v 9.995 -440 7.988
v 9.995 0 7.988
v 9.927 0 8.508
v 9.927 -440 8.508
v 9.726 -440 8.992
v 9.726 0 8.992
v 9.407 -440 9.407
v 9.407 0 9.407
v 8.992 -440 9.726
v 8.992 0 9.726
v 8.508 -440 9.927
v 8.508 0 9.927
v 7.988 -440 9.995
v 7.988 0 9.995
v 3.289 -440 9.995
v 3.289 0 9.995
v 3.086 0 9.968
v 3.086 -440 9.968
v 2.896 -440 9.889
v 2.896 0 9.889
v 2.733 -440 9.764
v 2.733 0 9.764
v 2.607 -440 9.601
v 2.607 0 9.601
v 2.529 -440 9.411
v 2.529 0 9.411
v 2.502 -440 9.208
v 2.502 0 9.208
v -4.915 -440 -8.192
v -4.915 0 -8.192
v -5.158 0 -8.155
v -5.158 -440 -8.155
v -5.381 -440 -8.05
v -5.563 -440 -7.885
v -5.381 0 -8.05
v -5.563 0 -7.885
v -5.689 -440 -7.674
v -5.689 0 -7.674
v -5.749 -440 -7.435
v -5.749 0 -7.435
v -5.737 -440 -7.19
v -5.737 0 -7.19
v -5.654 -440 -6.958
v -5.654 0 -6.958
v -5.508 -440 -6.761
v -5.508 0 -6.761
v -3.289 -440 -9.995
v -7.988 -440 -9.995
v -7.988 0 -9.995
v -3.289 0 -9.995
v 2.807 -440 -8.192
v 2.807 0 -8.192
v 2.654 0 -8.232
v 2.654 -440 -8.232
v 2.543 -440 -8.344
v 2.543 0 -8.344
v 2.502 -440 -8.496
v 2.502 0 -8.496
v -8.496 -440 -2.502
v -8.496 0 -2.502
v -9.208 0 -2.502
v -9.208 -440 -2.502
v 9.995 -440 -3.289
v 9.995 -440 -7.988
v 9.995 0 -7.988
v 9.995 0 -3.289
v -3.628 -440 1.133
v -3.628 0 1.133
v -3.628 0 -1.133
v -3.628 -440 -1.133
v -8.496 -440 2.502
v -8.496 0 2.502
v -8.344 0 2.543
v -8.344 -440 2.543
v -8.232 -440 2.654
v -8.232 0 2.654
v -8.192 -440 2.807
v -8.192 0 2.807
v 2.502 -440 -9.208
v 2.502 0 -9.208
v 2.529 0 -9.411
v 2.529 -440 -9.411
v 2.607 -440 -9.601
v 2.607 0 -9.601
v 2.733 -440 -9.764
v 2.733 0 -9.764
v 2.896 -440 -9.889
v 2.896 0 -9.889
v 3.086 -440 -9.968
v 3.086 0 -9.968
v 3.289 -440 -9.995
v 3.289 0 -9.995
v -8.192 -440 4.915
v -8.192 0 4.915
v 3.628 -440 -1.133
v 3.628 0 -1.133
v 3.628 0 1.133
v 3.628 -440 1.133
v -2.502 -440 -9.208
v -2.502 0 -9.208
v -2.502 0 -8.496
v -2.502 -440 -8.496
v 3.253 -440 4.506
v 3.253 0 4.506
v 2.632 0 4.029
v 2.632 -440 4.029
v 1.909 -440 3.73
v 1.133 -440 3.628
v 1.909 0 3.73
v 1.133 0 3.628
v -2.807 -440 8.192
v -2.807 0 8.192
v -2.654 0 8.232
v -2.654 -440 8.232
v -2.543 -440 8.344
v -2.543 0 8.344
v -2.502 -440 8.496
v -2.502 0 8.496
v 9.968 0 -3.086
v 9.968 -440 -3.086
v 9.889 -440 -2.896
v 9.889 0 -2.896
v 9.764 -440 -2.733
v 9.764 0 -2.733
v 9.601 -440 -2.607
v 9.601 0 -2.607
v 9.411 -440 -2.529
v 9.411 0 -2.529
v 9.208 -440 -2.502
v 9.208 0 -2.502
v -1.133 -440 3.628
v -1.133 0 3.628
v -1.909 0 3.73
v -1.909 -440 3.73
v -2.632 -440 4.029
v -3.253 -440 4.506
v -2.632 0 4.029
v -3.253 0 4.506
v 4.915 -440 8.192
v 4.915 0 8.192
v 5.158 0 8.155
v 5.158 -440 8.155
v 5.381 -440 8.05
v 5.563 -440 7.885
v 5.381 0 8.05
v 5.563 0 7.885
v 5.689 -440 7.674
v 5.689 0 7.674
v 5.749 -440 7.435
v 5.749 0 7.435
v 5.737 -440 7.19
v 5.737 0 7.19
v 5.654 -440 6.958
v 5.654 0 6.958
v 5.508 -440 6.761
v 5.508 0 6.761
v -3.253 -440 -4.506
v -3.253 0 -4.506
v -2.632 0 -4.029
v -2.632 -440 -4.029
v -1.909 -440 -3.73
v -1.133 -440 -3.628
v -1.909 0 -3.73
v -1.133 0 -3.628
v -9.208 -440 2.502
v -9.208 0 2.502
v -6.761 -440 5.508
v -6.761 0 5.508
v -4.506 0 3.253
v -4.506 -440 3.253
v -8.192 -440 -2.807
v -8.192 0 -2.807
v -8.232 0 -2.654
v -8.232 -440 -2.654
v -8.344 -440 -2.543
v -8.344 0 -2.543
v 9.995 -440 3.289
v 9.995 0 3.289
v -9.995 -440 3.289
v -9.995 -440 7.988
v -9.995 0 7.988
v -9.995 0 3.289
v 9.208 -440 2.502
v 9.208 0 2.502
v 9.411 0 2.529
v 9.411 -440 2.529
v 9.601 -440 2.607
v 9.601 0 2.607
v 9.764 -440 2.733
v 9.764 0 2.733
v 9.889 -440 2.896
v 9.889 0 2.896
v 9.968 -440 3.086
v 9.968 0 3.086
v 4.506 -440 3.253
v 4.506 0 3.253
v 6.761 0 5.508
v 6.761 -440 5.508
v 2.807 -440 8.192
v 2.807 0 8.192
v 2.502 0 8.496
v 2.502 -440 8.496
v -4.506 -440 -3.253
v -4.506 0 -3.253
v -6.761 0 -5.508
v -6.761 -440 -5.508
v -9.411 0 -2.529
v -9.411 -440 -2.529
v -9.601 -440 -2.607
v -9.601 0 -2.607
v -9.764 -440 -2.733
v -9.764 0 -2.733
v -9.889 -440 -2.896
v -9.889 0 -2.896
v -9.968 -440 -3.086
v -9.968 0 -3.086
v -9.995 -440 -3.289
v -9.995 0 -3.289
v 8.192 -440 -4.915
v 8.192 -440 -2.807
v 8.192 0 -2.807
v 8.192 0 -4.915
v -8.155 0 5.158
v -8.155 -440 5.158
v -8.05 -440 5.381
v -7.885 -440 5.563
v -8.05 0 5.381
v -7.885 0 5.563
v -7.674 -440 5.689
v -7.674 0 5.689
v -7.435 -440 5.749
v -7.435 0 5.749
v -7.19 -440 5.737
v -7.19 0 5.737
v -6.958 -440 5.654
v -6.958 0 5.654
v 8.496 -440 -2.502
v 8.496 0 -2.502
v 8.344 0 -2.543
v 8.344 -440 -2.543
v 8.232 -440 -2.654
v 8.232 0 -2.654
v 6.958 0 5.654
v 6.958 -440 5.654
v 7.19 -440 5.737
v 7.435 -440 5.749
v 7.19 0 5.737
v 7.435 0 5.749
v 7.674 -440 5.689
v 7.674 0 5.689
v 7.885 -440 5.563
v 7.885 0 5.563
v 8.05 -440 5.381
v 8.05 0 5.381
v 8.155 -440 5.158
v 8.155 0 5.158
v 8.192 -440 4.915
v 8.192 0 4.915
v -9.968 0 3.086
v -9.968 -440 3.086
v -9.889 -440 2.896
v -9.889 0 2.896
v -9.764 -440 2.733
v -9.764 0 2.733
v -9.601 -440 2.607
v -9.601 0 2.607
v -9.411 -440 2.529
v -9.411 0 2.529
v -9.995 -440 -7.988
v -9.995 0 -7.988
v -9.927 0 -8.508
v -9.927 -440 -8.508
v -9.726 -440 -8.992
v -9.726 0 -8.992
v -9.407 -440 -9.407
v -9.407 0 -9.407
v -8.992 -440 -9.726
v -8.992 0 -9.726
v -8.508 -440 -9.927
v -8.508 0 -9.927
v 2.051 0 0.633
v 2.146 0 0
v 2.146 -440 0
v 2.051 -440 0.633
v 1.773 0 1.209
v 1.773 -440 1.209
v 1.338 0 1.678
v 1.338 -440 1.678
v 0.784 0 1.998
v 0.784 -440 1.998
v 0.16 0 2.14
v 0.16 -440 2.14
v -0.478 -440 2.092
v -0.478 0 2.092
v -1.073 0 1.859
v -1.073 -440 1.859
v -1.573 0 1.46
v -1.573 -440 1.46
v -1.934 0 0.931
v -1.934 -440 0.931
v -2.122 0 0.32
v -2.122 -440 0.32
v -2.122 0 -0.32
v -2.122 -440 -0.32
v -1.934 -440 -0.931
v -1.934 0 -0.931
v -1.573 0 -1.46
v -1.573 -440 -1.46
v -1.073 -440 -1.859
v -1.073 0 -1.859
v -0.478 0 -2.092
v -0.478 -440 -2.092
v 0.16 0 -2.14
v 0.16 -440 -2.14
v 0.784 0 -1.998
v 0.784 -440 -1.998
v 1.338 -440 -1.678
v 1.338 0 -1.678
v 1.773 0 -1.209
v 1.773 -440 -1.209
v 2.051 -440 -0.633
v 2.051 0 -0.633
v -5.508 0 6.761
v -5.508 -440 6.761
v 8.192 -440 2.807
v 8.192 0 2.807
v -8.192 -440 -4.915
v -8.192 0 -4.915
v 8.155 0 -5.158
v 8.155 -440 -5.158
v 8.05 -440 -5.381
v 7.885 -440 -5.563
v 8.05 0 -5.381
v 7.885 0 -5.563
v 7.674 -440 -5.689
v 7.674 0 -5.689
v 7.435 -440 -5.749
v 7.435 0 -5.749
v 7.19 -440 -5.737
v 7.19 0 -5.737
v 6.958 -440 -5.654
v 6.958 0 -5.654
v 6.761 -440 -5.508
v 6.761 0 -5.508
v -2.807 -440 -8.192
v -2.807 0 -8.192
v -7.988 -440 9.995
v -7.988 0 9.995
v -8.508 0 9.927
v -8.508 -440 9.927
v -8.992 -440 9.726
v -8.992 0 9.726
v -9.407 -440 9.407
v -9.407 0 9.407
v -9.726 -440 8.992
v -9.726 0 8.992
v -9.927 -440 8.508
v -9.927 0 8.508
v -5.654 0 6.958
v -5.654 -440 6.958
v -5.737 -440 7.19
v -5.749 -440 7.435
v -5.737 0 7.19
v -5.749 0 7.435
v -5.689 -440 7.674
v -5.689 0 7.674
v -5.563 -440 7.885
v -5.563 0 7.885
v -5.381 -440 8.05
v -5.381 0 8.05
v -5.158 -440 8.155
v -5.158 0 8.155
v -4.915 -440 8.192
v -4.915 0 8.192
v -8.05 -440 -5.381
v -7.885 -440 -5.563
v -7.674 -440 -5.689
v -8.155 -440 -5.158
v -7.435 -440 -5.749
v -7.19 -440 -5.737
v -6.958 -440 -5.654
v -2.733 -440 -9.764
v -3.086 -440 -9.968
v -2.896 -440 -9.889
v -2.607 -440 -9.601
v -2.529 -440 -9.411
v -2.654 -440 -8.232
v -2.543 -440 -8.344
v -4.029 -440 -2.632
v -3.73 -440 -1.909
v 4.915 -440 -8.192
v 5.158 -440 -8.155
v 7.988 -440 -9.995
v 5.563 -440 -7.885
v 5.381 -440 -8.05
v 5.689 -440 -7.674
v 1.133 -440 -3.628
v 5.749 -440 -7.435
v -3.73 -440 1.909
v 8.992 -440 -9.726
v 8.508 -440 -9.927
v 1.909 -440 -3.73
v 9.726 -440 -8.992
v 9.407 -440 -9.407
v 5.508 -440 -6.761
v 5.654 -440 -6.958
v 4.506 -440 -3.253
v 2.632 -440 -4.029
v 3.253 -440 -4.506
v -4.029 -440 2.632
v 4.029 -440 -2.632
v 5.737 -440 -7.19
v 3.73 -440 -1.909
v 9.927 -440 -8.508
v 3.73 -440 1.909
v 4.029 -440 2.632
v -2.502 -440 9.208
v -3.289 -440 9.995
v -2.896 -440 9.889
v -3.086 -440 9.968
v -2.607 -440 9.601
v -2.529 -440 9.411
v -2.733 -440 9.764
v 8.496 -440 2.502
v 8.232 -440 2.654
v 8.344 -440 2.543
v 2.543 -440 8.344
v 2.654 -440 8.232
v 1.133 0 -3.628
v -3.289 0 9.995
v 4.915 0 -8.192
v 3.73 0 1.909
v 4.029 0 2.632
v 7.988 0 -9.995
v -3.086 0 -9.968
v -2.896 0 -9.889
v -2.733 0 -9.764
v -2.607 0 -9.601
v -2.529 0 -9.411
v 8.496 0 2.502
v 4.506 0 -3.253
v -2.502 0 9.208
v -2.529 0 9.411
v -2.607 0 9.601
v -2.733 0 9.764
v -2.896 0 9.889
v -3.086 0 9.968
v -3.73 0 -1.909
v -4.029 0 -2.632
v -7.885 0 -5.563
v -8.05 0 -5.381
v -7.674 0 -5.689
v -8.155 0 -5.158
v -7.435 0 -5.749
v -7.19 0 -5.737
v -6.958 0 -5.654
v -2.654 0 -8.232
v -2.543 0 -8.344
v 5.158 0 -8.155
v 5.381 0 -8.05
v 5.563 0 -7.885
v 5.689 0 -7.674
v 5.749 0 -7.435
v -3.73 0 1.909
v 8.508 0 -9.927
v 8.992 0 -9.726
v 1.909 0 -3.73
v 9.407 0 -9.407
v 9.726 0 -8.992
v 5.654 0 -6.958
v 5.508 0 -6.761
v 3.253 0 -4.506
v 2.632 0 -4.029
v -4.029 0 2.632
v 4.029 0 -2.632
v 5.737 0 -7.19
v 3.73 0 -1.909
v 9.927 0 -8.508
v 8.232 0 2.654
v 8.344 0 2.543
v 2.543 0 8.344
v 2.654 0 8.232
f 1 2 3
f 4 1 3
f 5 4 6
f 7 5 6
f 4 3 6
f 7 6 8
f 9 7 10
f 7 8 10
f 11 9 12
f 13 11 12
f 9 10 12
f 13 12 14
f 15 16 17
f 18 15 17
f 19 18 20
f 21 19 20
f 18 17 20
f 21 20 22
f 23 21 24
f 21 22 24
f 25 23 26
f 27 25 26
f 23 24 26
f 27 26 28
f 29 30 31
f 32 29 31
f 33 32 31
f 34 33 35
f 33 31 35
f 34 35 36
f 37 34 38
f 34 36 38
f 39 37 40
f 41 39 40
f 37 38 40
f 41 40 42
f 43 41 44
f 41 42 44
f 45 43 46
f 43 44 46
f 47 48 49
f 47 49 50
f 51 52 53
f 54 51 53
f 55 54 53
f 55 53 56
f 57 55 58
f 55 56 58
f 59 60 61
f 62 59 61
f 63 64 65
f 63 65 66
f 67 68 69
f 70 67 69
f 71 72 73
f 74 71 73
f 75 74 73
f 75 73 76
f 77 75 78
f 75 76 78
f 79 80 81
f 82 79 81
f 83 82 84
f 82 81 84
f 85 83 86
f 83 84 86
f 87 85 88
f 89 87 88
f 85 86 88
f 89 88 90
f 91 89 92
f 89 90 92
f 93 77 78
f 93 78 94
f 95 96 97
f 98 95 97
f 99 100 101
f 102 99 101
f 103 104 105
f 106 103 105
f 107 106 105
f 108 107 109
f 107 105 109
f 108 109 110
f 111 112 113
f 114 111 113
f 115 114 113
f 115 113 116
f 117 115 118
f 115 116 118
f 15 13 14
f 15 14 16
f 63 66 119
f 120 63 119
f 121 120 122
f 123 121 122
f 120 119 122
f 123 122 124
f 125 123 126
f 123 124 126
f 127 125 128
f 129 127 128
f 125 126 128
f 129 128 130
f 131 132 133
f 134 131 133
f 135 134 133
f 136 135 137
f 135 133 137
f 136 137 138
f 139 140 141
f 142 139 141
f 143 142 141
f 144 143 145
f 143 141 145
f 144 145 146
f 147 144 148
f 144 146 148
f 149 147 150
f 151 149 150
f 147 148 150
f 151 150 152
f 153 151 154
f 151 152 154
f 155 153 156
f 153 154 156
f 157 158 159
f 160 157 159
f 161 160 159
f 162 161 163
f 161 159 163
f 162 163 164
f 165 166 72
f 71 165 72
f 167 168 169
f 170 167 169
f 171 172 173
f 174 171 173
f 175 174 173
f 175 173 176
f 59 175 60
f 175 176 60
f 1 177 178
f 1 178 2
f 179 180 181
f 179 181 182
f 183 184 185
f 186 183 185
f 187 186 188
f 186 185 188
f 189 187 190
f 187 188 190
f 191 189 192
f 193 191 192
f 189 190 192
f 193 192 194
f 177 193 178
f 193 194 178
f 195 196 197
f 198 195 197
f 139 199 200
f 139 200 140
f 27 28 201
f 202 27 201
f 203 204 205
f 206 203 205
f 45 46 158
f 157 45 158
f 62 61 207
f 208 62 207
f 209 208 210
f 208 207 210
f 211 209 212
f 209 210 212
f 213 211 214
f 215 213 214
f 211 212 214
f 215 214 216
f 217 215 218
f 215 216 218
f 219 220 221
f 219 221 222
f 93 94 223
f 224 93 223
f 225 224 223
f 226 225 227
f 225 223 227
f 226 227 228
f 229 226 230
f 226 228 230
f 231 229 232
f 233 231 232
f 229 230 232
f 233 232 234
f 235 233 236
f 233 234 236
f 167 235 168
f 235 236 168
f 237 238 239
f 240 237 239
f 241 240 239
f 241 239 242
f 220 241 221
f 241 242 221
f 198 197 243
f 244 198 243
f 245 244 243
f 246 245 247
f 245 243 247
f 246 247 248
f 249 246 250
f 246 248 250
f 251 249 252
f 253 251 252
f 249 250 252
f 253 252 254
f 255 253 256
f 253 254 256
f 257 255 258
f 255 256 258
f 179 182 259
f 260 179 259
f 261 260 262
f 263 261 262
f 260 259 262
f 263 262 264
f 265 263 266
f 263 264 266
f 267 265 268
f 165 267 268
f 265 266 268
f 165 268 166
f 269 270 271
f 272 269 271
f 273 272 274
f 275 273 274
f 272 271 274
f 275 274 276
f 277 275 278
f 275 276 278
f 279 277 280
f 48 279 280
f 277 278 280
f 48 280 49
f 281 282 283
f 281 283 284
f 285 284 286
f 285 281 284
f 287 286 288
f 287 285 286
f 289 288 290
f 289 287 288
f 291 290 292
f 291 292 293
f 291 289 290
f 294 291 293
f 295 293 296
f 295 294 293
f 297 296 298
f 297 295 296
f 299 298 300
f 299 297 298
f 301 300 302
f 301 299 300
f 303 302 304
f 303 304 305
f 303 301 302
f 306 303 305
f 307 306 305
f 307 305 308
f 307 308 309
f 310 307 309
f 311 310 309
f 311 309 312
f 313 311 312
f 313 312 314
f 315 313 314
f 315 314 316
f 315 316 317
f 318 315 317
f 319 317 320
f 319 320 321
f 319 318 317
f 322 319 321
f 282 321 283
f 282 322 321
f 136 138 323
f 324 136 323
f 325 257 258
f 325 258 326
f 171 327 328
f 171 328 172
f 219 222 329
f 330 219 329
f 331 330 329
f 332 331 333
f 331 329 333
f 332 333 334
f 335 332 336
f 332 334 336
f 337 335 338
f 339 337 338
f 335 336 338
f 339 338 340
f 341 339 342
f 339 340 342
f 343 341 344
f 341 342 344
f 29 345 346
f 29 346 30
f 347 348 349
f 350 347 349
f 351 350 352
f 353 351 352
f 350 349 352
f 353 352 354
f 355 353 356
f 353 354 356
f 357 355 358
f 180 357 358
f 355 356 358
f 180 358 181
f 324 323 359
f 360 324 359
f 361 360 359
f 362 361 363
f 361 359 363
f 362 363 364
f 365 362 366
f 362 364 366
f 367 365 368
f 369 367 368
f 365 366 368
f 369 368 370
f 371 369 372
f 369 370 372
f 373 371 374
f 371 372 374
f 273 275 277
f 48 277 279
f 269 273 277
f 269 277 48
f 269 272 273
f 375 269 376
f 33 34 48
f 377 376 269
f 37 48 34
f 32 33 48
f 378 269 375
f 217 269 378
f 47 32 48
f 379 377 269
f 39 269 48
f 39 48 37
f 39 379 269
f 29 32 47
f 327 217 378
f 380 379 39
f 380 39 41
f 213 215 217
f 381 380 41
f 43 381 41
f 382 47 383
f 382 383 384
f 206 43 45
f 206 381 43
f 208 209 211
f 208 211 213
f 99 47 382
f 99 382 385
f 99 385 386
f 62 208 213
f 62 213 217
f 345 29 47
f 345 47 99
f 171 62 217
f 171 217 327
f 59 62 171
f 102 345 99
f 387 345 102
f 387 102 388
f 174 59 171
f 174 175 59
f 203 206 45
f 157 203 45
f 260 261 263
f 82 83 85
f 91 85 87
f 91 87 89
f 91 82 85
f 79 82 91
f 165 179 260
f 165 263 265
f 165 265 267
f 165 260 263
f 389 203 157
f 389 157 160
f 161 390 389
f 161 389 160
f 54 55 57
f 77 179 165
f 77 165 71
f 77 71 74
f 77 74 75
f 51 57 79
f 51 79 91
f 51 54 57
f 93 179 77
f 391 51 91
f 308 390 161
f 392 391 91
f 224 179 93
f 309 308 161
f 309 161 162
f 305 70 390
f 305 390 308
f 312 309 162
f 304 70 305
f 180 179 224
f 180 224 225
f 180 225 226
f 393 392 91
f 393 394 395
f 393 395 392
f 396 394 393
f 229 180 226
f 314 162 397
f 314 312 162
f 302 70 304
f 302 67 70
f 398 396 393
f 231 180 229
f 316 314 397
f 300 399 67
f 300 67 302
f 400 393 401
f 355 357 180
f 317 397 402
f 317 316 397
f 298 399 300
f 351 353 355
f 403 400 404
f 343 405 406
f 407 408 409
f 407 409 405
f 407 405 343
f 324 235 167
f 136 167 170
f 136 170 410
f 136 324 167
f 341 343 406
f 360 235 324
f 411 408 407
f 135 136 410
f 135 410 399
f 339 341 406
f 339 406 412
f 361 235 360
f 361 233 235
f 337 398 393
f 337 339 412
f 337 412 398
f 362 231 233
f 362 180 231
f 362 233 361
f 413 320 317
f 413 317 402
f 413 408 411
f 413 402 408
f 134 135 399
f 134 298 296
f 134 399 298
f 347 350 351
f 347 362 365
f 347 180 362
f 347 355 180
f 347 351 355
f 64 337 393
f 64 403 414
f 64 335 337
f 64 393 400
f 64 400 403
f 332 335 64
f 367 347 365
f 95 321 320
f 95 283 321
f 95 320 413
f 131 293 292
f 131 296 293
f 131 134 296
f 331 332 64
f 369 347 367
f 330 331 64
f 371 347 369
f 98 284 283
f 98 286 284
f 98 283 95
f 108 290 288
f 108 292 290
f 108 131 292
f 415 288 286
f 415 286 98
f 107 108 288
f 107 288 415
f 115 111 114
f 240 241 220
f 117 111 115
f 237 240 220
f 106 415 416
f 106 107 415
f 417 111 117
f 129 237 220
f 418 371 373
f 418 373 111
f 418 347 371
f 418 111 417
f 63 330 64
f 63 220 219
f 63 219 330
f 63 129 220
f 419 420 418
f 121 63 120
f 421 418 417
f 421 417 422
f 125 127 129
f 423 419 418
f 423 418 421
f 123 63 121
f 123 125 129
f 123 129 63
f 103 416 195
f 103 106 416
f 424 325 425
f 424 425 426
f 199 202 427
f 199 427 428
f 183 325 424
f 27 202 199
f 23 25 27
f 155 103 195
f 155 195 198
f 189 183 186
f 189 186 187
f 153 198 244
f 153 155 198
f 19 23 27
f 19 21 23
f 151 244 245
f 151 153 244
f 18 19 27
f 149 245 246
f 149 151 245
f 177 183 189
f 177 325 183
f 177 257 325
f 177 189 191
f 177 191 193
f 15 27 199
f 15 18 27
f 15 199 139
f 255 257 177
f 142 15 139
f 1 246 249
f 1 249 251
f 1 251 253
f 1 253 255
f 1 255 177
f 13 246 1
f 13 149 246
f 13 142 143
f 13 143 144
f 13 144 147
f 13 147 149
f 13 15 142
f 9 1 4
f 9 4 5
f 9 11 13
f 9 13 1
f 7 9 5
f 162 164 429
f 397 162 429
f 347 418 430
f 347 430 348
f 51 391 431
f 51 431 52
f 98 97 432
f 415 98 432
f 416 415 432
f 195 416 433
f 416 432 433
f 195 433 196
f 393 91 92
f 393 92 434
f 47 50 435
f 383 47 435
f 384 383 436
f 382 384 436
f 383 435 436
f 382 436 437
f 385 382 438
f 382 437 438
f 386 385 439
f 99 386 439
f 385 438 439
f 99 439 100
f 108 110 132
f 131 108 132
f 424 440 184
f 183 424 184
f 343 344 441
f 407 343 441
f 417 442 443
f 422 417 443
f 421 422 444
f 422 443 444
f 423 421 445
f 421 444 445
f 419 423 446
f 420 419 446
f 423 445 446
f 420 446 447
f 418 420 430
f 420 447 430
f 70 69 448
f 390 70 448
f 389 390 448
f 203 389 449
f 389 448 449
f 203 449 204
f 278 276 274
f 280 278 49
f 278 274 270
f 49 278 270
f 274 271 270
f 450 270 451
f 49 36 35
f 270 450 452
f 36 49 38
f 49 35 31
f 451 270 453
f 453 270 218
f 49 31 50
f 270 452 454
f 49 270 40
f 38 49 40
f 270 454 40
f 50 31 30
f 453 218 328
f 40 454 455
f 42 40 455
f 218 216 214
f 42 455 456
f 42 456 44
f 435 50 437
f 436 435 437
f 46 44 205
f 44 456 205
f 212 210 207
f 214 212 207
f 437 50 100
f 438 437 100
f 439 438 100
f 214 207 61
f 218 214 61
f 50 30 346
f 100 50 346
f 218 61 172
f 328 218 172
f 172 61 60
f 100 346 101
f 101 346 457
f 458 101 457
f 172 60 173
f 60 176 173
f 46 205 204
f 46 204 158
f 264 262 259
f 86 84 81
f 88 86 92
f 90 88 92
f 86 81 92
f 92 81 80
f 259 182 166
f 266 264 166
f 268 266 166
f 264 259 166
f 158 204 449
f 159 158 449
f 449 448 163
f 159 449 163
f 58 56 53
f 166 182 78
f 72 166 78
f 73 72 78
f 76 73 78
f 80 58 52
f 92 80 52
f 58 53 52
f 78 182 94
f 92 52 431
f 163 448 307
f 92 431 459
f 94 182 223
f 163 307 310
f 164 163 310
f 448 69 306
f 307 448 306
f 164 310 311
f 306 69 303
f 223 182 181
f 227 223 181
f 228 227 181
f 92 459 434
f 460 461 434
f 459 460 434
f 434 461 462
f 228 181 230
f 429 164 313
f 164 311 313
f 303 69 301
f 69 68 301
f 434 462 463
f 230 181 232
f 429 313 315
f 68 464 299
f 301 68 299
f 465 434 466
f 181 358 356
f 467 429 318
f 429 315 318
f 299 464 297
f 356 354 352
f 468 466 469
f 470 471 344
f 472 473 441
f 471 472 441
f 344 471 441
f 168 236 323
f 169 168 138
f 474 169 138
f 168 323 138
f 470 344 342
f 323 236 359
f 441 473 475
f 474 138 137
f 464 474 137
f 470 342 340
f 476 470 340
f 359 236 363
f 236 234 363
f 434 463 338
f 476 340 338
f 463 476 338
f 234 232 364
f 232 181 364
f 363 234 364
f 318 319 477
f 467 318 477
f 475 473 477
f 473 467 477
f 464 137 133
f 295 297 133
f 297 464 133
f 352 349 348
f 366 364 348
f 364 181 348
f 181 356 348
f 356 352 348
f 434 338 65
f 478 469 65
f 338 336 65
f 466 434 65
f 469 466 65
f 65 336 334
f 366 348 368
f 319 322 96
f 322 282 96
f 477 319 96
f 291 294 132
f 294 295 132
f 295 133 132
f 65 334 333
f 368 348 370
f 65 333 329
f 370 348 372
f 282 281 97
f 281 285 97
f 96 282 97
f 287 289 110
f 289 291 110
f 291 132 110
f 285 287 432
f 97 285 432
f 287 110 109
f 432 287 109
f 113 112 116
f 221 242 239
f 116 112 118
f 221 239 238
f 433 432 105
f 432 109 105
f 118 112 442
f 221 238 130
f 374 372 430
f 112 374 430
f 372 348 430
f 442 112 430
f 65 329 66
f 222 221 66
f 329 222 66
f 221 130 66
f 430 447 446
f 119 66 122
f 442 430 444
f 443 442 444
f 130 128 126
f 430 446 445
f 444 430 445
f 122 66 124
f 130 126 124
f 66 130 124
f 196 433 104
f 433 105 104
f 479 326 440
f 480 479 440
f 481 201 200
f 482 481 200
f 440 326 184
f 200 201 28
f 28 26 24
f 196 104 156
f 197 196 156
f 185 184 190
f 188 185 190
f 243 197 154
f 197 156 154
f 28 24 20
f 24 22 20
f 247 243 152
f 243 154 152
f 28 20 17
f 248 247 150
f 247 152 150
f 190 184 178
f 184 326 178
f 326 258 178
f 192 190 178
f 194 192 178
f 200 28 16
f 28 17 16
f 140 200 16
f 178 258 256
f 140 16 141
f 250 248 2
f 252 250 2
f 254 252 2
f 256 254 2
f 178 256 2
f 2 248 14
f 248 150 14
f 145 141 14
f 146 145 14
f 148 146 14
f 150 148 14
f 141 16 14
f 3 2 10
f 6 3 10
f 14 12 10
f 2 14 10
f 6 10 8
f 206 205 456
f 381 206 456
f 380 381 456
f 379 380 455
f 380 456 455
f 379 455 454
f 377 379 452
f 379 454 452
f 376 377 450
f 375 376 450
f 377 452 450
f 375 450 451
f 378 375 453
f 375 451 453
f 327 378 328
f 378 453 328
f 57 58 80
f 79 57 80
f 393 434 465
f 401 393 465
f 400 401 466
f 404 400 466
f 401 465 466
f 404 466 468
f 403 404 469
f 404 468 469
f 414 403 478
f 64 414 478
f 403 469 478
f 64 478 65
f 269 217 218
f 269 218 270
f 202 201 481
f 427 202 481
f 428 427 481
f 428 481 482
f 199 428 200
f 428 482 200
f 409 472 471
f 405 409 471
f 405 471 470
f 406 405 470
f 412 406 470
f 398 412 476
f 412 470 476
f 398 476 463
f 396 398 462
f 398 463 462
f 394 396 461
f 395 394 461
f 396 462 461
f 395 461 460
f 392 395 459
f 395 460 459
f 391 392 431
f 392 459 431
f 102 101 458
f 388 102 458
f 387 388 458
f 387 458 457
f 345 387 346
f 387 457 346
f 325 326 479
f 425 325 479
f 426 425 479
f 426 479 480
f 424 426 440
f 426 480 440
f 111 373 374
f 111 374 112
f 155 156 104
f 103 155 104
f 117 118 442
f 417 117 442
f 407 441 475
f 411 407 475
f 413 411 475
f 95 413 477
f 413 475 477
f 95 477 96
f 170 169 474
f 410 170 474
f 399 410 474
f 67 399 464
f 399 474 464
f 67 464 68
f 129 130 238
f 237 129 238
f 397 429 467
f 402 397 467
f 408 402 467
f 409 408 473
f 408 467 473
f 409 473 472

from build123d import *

# Parameters (mm, degrees)
F0_R     = 2.1463
F1_DEPTH = 440


with BuildPart() as f1:
    # F0 (on Front) → F1 (new body)
    with BuildSketch(Plane.XZ):
        with BuildLine():
            Line((-3.2893, 9.9949), (-7.9883, 9.9949))
            ThreePointArc((-7.9883, 9.9949), (-9.40718, 9.40718), (-9.9949, 7.9883))
            Line((-9.9949, 7.9883), (-9.9949, 3.2893))
            ThreePointArc((-9.9949, 3.2893), (-9.764276, 2.732524), (-9.2075, 2.5019))
            Line((-9.2075, 2.5019), (-8.4963, 2.5019))
            ThreePointArc((-8.4963, 2.5019), (-8.280774, 2.591174), (-8.1915, 2.8067))
            Line((-8.1915, 2.8067), (-8.1915, 4.9149))
            ThreePointArc((-8.1915, 4.9149), (-7.674065, 5.689296), (-6.760603, 5.507597))
            Line((-6.760603, 5.507597), (-4.505766, 3.25276))
            ThreePointArc((-4.505766, 3.25276), (-3.856054, 2.280398), (-3.627906, 1.133419))
            Line((-3.627906, 1.133419), (-3.627906, -1.133419))
            ThreePointArc((-3.627906, -1.133419), (-3.856054, -2.280398), (-4.505766, -3.25276))
            Line((-4.505766, -3.25276), (-6.760603, -5.507597))
            ThreePointArc((-6.760603, -5.507597), (-7.674065, -5.689296), (-8.1915, -4.9149))
            Line((-8.1915, -4.9149), (-8.1915, -2.8067))
            ThreePointArc((-8.1915, -2.8067), (-8.280774, -2.591174), (-8.4963, -2.5019))
            Line((-8.4963, -2.5019), (-9.2075, -2.5019))
            ThreePointArc((-9.2075, -2.5019), (-9.764276, -2.732524), (-9.9949, -3.2893))
            Line((-9.9949, -3.2893), (-9.9949, -7.9883))
            ThreePointArc((-9.9949, -7.9883), (-9.40718, -9.40718), (-7.9883, -9.9949))
            Line((-7.9883, -9.9949), (-3.2893, -9.9949))
            ThreePointArc((-3.2893, -9.9949), (-2.732524, -9.764276), (-2.5019, -9.2075))
            Line((-2.5019, -9.2075), (-2.5019, -8.4963))
            ThreePointArc((-2.5019, -8.4963), (-2.591174, -8.280774), (-2.8067, -8.1915))
            Line((-2.8067, -8.1915), (-4.9149, -8.1915))
            ThreePointArc((-4.9149, -8.1915), (-5.689296, -7.674065), (-5.507597, -6.760603))
            Line((-5.507597, -6.760603), (-3.25276, -4.505766))
            ThreePointArc((-3.25276, -4.505766), (-2.280398, -3.856054), (-1.133419, -3.627906))
            Line((-1.133419, -3.627906), (1.133419, -3.627906))
            ThreePointArc((1.133419, -3.627906), (2.280398, -3.856054), (3.25276, -4.505766))
            Line((3.25276, -4.505766), (5.507597, -6.760603))
            ThreePointArc((5.507597, -6.760603), (5.689296, -7.674065), (4.9149, -8.1915))
            Line((4.9149, -8.1915), (2.8067, -8.1915))
            ThreePointArc((2.8067, -8.1915), (2.591174, -8.280774), (2.5019, -8.4963))
            Line((2.5019, -8.4963), (2.5019, -9.2075))
            ThreePointArc((2.5019, -9.2075), (2.732524, -9.764276), (3.2893, -9.9949))
            Line((3.2893, -9.9949), (7.9883, -9.9949))
            ThreePointArc((7.9883, -9.9949), (9.40718, -9.40718), (9.9949, -7.9883))
            Line((9.9949, -7.9883), (9.9949, -3.2893))
            ThreePointArc((9.9949, -3.2893), (9.764276, -2.732524), (9.2075, -2.5019))
            Line((9.2075, -2.5019), (8.4963, -2.5019))
            ThreePointArc((8.4963, -2.5019), (8.280774, -2.591174), (8.1915, -2.8067))
            Line((8.1915, -2.8067), (8.1915, -4.9149))
            ThreePointArc((8.1915, -4.9149), (7.674065, -5.689296), (6.760603, -5.507597))
            Line((6.760603, -5.507597), (4.505766, -3.25276))
            ThreePointArc((4.505766, -3.25276), (3.856054, -2.280398), (3.627906, -1.133419))
            Line((3.627906, -1.133419), (3.627906, 1.133419))
            ThreePointArc((3.627906, 1.133419), (3.856054, 2.280398), (4.505766, 3.25276))
            Line((4.505766, 3.25276), (6.760603, 5.507597))
            ThreePointArc((6.760603, 5.507597), (7.674065, 5.689296), (8.1915, 4.9149))
            Line((8.1915, 4.9149), (8.1915, 2.8067))
            ThreePointArc((8.1915, 2.8067), (8.280774, 2.591174), (8.4963, 2.5019))
            Line((8.4963, 2.5019), (9.2075, 2.5019))
            ThreePointArc((9.2075, 2.5019), (9.764276, 2.732524), (9.9949, 3.2893))
            Line((9.9949, 3.2893), (9.9949, 7.9883))
            ThreePointArc((9.9949, 7.9883), (9.40718, 9.40718), (7.9883, 9.9949))
            Line((7.9883, 9.9949), (3.2893, 9.9949))
            ThreePointArc((3.2893, 9.9949), (2.732524, 9.764276), (2.5019, 9.2075))
            Line((2.5019, 9.2075), (2.5019, 8.4963))
            ThreePointArc((2.5019, 8.4963), (2.591174, 8.280774), (2.8067, 8.1915))
            Line((2.8067, 8.1915), (4.9149, 8.1915))
            ThreePointArc((4.9149, 8.1915), (5.689296, 7.674065), (5.507597, 6.760603))
            Line((5.507597, 6.760603), (3.25276, 4.505766))
            ThreePointArc((3.25276, 4.505766), (2.280398, 3.856054), (1.133419, 3.627906))
            Line((1.133419, 3.627906), (-1.133419, 3.627906))
            ThreePointArc((-1.133419, 3.627906), (-2.280398, 3.856054), (-3.25276, 4.505766))
            Line((-3.25276, 4.505766), (-5.507597, 6.760603))
            ThreePointArc((-5.507597, 6.760603), (-5.689296, 7.674065), (-4.9149, 8.1915))
            Line((-4.9149, 8.1915), (-2.8067, 8.1915))
            ThreePointArc((-2.8067, 8.1915), (-2.591174, 8.280774), (-2.5019, 8.4963))
            Line((-2.5019, 8.4963), (-2.5019, 9.2075))
            ThreePointArc((-2.5019, 9.2075), (-2.732524, 9.764276), (-3.2893, 9.9949))
        make_face()
        Circle(F0_R, mode=Mode.SUBTRACT)
    extrude(amount=F1_DEPTH)


solid = f1.part
